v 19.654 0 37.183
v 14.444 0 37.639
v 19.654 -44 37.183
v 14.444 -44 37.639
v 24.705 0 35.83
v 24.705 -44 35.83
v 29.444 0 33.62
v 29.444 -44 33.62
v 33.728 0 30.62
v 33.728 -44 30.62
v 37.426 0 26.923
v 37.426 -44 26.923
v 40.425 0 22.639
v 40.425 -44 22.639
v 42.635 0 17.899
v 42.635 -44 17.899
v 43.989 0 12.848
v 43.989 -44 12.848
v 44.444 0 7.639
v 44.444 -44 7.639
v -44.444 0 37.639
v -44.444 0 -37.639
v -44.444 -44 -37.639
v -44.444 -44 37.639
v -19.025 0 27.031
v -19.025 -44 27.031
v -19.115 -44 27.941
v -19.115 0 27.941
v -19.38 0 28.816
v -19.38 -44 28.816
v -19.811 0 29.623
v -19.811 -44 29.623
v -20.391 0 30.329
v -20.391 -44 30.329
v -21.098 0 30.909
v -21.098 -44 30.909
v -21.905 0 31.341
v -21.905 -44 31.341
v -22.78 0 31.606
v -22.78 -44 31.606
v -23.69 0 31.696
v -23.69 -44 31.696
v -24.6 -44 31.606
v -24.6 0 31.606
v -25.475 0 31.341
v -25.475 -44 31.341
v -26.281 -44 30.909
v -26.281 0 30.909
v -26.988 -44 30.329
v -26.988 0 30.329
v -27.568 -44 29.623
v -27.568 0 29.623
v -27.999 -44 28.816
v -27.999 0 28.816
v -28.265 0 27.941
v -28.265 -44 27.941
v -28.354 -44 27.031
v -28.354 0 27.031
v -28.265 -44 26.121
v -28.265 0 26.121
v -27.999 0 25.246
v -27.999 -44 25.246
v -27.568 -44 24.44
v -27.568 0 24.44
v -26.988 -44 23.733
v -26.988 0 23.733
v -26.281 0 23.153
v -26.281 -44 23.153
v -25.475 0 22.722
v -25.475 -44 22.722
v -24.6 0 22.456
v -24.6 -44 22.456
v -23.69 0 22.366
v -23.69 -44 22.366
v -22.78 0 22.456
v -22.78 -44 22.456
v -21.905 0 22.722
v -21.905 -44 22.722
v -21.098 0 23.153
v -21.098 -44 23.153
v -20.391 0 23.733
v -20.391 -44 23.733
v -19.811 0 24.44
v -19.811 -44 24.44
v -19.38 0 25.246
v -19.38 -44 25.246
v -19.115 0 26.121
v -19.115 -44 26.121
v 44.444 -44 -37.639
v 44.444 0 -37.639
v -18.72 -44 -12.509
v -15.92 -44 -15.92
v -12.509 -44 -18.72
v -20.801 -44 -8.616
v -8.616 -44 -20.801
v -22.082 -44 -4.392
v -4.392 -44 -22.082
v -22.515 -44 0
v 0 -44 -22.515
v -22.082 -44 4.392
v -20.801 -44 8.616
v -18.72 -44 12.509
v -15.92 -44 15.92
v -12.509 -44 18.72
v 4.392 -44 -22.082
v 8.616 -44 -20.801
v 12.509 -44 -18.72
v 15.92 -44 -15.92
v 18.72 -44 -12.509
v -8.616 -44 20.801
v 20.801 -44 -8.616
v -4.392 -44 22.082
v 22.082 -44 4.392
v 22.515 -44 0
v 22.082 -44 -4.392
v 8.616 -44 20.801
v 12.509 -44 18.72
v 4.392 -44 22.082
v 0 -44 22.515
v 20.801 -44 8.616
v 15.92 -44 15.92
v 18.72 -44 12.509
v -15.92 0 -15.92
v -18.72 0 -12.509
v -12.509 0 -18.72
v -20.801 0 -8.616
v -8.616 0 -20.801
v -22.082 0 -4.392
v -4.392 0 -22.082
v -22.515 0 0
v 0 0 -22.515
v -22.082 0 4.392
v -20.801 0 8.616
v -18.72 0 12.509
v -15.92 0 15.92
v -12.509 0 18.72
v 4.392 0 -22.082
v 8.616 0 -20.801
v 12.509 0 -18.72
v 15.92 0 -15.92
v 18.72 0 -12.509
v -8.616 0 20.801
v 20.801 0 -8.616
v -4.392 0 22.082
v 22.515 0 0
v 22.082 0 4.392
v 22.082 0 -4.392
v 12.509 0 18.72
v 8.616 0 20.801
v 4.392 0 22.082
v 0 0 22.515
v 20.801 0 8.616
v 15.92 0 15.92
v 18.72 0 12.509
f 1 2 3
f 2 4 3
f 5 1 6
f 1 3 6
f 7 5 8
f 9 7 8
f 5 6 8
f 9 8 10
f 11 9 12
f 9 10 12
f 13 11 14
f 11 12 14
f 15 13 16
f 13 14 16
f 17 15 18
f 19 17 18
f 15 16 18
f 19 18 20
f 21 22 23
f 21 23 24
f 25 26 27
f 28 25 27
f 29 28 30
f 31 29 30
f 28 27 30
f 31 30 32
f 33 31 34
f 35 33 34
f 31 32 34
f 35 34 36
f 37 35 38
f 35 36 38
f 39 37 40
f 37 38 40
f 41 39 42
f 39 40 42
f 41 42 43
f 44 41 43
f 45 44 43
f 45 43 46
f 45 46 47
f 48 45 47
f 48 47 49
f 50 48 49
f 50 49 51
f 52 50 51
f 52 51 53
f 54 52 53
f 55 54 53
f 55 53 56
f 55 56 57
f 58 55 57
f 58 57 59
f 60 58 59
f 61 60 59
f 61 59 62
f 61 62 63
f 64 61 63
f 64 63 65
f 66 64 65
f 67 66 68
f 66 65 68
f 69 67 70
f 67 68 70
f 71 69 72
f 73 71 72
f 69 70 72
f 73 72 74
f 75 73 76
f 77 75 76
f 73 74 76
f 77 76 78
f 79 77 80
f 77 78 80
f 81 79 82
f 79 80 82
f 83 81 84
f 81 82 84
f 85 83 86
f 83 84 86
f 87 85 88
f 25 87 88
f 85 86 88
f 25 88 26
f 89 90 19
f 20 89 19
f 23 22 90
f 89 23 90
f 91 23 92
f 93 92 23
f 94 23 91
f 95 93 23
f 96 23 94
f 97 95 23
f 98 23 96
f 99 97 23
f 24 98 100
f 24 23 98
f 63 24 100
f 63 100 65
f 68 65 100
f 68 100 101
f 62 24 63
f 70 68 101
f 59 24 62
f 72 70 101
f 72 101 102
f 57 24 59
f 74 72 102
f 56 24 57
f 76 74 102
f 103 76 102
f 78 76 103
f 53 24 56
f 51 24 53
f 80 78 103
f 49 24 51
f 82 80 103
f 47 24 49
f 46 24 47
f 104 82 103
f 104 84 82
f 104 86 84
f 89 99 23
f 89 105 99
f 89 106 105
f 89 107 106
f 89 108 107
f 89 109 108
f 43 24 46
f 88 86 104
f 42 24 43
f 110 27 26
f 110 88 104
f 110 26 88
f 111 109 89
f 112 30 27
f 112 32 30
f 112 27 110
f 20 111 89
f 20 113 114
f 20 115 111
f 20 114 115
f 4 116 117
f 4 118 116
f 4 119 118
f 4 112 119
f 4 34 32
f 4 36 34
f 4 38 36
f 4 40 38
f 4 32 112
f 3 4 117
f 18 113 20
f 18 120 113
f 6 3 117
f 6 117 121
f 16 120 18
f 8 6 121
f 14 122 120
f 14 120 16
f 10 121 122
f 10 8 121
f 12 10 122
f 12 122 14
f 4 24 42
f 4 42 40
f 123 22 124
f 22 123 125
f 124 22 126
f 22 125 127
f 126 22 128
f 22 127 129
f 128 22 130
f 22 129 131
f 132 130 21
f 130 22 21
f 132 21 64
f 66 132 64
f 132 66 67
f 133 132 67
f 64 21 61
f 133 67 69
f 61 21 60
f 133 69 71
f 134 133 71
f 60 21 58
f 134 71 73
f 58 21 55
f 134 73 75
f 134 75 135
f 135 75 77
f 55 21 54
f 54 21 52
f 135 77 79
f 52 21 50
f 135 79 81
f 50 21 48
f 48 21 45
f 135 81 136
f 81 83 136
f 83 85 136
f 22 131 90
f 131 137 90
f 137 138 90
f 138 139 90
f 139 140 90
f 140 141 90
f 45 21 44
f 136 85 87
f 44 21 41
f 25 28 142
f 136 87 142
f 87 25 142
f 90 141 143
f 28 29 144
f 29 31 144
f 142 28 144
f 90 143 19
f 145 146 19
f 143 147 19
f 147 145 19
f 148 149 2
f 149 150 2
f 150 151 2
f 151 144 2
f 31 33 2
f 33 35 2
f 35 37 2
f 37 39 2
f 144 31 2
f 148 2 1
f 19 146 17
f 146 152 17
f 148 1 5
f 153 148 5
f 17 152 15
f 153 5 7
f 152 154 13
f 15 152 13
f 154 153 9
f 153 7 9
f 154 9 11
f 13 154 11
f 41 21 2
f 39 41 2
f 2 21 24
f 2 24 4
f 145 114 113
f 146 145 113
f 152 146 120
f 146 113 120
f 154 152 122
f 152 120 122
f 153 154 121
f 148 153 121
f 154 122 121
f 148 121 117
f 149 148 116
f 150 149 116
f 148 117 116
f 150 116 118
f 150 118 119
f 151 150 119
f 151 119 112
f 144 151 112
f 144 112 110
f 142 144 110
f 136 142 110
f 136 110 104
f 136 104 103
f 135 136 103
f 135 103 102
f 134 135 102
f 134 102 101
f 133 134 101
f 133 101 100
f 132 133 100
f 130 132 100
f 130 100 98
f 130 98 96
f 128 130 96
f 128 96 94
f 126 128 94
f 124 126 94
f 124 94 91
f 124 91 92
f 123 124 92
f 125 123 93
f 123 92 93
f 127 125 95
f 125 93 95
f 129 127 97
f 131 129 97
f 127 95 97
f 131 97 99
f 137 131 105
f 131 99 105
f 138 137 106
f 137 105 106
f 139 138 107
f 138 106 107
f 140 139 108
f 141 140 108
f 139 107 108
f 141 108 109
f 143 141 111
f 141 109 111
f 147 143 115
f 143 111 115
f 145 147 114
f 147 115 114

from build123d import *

# Parameters (mm, degrees)
F0_W     = 88.888892
F0_H     = 75.277782
F1_DEPTH = 44
F2_R     = 22.514909
F3_DEPTH = 44.001
F4_R     = 4.664541
F5_DEPTH = 44.001
F6_R     = 30


with BuildPart() as f1:
    # F0 (on Front) → F1 (new body)
    with BuildSketch(Plane.XZ):
        Rectangle(F0_W, F0_H)
    extrude(amount=F1_DEPTH)

    # F2 (on face) → F3 (cut, through all)
    with BuildSketch(Plane.XZ.offset(44)):
        Circle(F2_R)
    extrude(amount=-F3_DEPTH, mode=Mode.SUBTRACT)

    # F4 (on face) → F5 (cut, through all)
    with BuildSketch(Plane.XZ.offset(44)):
        with Locations((-23.689743, 27.031031)):
            Circle(F4_R)
    extrude(amount=-F5_DEPTH, mode=Mode.SUBTRACT)

    # F6
    f6_edges = [f1.edges().sort_by_distance(p)[0] for p in [
        (44.444446, -22, 37.638891),
    ]]
    fillet(f6_edges, radius=F6_R)


solid = f1.part
